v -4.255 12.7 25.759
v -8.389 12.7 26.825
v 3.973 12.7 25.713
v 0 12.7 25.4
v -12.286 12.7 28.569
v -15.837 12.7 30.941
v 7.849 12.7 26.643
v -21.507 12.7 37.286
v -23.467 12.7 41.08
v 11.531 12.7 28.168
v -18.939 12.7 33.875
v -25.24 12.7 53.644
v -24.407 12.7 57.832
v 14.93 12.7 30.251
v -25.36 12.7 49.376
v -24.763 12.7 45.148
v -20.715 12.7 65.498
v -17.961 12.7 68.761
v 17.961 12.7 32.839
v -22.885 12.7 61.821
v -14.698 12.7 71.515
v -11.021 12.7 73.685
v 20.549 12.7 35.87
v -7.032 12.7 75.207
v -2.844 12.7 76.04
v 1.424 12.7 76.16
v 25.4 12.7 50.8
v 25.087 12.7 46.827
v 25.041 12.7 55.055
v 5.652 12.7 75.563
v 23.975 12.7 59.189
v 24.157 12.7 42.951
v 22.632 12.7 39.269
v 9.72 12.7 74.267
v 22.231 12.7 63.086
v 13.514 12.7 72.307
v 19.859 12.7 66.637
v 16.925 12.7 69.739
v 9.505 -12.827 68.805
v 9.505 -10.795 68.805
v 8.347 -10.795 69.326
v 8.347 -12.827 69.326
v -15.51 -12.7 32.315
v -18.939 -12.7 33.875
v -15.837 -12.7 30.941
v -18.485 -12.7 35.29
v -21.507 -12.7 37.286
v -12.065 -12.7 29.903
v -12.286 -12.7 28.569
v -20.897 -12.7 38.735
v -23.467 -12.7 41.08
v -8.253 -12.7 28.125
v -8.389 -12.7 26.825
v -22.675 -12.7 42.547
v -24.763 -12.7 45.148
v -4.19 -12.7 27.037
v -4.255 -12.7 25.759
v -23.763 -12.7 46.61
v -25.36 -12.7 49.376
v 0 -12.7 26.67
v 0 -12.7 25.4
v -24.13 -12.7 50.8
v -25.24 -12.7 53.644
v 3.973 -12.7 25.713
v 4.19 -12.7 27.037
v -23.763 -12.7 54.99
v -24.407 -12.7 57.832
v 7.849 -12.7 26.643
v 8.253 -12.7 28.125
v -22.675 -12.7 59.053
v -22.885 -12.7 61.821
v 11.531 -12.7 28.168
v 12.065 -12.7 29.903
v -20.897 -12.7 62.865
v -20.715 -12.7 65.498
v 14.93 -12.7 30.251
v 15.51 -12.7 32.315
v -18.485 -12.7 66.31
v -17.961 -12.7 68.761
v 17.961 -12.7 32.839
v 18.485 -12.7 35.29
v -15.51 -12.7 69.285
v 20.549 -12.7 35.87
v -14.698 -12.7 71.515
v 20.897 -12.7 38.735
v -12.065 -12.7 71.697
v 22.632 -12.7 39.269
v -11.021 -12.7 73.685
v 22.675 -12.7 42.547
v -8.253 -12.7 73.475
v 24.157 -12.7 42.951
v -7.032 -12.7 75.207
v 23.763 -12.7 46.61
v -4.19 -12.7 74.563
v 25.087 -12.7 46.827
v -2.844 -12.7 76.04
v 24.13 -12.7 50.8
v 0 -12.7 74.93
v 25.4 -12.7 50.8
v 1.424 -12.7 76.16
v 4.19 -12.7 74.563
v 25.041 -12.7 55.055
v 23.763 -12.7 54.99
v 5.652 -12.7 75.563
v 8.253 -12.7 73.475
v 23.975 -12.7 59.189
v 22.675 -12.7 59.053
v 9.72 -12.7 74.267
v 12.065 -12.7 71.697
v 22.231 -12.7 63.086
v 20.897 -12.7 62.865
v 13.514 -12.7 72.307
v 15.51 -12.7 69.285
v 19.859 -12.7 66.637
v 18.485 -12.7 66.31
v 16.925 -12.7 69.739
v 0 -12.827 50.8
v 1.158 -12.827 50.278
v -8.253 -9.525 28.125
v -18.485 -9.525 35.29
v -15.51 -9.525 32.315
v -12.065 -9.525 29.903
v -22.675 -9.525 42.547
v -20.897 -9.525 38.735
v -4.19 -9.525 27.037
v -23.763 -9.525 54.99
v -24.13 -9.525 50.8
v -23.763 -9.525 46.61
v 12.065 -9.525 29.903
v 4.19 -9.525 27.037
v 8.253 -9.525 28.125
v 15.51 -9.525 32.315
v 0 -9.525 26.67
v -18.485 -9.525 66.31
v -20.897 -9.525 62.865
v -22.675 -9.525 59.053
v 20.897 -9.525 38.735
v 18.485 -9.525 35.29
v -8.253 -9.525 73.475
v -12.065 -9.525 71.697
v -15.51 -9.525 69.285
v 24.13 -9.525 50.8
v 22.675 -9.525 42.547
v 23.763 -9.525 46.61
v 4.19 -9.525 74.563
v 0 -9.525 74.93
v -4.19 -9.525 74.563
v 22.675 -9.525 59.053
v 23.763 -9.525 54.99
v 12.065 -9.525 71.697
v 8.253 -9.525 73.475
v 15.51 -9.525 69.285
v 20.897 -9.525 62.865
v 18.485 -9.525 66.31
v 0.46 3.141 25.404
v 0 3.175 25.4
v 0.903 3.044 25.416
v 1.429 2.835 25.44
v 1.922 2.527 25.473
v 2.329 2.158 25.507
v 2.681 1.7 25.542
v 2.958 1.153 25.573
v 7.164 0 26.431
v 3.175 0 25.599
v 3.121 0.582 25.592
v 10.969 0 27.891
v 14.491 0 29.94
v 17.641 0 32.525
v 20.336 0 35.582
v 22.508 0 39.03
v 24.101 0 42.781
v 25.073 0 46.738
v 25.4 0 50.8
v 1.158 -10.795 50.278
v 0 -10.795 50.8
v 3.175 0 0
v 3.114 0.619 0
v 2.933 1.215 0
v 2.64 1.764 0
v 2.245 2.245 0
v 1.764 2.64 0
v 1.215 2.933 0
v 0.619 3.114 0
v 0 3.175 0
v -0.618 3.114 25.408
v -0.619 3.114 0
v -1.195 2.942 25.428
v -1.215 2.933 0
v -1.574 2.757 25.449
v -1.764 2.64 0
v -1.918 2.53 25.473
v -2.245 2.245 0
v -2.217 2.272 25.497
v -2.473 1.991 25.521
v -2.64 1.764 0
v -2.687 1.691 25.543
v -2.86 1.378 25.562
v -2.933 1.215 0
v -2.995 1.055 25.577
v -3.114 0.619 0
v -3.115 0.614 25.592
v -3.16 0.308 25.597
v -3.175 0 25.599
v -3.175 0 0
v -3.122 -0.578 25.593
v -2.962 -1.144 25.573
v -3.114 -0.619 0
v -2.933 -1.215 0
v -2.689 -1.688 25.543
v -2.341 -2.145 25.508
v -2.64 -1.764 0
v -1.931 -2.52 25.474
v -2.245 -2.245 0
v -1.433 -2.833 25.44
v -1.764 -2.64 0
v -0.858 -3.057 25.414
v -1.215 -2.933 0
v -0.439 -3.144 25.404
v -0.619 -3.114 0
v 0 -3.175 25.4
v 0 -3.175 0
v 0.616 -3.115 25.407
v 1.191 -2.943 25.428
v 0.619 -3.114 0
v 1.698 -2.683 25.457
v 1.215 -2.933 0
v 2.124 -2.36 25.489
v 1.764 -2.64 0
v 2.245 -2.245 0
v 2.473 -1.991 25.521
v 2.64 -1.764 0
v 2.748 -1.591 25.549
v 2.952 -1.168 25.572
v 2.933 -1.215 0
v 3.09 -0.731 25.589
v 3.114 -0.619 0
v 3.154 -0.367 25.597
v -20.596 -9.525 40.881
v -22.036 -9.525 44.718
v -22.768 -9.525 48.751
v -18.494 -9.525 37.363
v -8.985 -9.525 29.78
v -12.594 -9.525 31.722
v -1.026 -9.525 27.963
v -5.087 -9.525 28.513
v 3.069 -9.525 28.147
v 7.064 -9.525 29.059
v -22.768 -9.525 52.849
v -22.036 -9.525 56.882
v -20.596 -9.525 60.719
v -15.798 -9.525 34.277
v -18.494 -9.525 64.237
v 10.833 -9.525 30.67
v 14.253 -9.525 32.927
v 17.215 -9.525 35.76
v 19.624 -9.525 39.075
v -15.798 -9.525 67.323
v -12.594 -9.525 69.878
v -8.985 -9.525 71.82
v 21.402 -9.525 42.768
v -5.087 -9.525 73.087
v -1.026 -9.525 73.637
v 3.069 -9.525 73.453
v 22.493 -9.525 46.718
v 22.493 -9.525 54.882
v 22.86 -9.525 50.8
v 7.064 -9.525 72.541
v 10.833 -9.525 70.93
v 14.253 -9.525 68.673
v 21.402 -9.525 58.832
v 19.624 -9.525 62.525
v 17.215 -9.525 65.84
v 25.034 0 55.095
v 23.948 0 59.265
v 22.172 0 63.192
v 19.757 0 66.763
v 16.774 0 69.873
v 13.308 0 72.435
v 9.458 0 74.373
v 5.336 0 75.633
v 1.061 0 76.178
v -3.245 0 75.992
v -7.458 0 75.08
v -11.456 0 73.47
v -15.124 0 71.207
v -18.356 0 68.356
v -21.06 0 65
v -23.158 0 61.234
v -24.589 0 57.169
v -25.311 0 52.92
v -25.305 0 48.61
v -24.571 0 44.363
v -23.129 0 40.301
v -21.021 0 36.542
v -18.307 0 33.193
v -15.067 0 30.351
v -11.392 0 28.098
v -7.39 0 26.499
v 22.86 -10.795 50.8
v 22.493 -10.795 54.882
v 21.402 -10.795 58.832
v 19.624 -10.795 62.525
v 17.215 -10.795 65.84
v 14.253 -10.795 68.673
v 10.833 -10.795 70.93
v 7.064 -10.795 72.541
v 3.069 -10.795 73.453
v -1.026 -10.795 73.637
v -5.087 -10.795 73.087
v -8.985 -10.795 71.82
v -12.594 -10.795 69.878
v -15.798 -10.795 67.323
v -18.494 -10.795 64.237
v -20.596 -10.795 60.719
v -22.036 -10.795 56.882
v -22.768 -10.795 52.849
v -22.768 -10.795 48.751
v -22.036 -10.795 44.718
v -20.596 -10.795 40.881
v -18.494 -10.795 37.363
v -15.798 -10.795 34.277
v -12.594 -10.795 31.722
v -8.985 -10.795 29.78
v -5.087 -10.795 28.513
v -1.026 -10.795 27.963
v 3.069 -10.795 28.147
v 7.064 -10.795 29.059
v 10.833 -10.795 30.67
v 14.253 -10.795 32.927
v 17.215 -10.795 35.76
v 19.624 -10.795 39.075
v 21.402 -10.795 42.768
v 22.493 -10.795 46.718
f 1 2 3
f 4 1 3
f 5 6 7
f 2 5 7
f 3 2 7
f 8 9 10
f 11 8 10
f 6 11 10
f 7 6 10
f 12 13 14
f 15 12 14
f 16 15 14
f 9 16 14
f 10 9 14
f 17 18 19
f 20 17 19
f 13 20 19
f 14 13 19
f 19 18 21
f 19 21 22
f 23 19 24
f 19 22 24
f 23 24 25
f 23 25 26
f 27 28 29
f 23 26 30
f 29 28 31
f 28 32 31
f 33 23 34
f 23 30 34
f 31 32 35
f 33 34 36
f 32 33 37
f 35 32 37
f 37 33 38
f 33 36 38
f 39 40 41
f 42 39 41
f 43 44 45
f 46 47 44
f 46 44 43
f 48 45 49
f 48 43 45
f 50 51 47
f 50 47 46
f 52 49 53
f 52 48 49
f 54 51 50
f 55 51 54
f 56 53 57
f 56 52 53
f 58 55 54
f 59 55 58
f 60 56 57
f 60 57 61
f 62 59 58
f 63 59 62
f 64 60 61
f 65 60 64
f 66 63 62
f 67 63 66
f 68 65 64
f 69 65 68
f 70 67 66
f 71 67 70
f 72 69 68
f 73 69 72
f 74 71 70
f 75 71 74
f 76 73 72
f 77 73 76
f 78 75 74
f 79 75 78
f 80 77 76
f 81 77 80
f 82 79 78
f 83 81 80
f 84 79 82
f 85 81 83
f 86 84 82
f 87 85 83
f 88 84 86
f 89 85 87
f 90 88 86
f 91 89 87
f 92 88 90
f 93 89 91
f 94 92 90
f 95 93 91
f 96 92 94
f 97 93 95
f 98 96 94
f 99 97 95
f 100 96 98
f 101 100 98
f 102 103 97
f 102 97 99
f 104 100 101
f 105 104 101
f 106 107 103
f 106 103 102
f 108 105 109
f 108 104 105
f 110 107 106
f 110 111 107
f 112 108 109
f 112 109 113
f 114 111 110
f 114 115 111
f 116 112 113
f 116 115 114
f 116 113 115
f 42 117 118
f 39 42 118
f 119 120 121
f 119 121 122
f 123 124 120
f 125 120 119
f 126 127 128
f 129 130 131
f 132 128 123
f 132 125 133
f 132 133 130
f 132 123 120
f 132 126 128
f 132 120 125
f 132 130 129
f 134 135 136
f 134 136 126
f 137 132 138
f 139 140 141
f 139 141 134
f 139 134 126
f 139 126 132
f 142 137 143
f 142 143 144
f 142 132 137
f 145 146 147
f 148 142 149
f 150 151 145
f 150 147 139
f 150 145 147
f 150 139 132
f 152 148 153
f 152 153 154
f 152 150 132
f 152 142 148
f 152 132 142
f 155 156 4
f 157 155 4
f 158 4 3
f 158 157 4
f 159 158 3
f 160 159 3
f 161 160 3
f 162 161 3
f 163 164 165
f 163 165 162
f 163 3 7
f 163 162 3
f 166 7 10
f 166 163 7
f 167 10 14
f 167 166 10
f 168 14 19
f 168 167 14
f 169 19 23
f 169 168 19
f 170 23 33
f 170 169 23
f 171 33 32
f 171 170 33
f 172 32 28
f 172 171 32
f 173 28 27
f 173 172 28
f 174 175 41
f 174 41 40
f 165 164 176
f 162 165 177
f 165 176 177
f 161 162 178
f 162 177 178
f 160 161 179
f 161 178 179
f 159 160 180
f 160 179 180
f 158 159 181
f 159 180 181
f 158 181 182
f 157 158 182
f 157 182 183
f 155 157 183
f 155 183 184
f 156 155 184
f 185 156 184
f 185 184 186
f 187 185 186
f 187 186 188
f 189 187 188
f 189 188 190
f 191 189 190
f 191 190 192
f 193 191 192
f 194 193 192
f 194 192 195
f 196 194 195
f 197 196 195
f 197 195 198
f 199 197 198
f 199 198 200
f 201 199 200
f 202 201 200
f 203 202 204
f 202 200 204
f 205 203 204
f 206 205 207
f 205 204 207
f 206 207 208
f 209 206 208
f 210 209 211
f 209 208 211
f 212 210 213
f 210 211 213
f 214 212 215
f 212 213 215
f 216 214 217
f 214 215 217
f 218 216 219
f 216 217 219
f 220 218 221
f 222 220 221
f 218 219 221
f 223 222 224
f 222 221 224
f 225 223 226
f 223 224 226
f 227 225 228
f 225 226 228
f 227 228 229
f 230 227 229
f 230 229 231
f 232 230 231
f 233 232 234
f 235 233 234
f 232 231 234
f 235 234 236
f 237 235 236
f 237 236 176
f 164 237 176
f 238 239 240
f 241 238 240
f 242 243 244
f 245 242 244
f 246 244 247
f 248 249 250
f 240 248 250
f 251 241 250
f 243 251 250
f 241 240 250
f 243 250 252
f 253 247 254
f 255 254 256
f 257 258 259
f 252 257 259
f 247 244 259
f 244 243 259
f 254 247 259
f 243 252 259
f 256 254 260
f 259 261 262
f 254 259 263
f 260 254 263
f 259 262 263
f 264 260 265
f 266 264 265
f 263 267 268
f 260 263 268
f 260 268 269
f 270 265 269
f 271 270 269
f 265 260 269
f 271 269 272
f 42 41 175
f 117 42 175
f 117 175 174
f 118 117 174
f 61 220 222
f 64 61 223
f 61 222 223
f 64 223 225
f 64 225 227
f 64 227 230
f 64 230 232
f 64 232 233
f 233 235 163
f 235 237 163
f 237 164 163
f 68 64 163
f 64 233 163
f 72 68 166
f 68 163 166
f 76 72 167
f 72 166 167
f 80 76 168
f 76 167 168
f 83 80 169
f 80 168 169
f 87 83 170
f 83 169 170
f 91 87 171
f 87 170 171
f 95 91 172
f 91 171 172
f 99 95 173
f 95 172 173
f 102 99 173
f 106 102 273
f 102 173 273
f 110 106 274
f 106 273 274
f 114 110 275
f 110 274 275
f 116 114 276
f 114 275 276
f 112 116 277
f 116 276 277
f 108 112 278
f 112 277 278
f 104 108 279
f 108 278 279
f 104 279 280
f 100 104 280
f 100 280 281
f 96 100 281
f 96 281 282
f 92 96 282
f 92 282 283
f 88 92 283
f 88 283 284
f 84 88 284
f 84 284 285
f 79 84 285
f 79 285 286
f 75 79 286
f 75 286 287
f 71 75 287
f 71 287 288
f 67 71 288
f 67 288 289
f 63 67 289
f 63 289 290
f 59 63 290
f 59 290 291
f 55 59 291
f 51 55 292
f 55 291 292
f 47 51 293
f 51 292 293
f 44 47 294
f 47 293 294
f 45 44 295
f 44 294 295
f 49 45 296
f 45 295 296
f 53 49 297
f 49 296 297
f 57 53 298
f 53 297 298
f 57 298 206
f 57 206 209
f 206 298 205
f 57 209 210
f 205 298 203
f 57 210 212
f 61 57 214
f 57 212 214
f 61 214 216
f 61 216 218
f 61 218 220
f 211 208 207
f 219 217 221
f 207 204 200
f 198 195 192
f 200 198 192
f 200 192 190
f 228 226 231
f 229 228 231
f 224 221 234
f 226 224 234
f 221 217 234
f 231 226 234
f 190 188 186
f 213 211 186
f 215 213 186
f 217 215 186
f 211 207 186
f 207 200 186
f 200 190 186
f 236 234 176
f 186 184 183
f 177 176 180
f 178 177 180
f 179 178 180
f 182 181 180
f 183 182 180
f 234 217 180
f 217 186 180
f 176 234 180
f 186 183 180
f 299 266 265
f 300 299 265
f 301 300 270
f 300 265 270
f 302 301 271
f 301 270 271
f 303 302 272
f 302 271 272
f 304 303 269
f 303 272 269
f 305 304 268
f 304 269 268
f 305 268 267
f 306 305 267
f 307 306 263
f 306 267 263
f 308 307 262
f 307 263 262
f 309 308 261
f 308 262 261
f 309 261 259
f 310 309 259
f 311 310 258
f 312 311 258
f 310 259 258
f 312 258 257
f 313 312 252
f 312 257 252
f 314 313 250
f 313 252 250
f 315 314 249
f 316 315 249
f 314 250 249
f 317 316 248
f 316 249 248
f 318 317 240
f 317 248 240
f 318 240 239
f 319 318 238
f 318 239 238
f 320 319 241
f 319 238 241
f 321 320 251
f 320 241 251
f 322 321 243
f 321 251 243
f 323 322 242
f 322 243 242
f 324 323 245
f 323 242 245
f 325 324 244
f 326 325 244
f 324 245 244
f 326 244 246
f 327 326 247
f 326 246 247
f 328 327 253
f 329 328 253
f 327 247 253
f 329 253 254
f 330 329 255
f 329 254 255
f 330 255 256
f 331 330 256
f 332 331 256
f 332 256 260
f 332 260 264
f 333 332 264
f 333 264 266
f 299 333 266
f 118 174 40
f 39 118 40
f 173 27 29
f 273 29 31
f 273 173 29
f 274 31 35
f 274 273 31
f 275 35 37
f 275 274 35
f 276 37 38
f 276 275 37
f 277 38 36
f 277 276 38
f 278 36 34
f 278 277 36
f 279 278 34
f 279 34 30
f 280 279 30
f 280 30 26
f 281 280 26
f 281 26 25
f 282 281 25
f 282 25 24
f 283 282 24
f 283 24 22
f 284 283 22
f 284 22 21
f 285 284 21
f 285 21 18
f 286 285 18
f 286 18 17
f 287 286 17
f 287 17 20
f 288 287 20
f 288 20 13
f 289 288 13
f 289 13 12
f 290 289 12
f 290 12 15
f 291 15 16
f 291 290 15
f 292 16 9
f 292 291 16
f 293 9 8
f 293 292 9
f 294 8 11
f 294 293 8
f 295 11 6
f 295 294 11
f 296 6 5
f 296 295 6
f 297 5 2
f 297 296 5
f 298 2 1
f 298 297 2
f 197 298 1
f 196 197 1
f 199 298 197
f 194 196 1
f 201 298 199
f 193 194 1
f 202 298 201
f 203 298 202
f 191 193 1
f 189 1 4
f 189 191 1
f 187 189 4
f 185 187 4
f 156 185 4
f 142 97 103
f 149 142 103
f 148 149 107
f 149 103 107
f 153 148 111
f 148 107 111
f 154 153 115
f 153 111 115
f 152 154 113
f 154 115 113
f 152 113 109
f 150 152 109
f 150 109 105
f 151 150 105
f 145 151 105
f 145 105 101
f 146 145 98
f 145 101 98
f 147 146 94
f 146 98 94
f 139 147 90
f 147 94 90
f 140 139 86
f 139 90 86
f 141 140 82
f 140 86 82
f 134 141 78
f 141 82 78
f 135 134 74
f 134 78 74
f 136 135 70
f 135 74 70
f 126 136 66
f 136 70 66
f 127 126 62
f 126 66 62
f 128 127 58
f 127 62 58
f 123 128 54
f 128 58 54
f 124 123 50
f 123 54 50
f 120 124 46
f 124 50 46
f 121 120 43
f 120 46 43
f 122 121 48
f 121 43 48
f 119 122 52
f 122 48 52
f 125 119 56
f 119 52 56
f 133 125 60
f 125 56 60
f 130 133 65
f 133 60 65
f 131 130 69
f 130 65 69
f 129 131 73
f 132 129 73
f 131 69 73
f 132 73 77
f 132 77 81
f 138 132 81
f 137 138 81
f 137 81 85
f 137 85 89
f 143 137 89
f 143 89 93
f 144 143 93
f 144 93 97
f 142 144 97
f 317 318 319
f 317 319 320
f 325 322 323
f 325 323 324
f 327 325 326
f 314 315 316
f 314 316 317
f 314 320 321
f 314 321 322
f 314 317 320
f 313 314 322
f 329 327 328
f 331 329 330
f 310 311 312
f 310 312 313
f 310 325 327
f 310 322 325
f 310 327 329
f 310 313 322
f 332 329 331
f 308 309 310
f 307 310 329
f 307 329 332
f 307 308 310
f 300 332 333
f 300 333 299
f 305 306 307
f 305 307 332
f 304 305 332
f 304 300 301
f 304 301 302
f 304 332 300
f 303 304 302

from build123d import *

# Parameters (mm, degrees)
F1_R      = 3.175
F2_DEPTH  = 38.1
F3_DEPTH  = 12.7
F4_R      = 24.13
F5_DEPTH  = 3.175
F6_R      = 24.13
F7_DEPTH  = 3.175
F8_R      = 22.86
F9_DEPTH  = 1.27
F11_DEPTH = 2.032


with BuildPart() as f2:
    # F1 (on Top) → F2 (new body)
    with BuildSketch(Plane.XY):
        Circle(F1_R)
    extrude(amount=F2_DEPTH)

    # F0 (on Front) → F3 (join, symmetric)
    with BuildSketch(Plane.XZ):
        with BuildLine():
            ThreePointArc((0, 25.4), (17.9605122421, 32.8394877579), (25.4, 50.8))
            ThreePointArc((25.4, 50.8), (-17.9605122421, 68.7605122421), (0, 25.4))
        make_face()
    extrude(amount=F3_DEPTH, both=True)

    # F4 (on face) → F5 (join)
    with BuildSketch(Plane.XZ.offset(12.7)):
        with Locations((0, 50.8)):
            Circle(F4_R)
    extrude(amount=-F5_DEPTH)

    # F6 (on face) → F7 (cut)
    with BuildSketch(Plane.XZ.offset(12.7)):
        with Locations((0, 50.8)):
            Circle(F6_R)
    extrude(amount=-F7_DEPTH, mode=Mode.SUBTRACT)


with BuildPart() as f9:
    # F8 (on face) → F9 (new body)
    with BuildSketch(Plane.XZ.offset(9.525)):
        with Locations((0, 50.8)):
            Circle(F8_R)
    extrude(amount=F9_DEPTH)


with BuildPart() as f11:
    # F10 (on face) → F11 (new body)
    with BuildSketch(Plane.XZ.offset(10.795)):
        Polygon((8.3469611164, 69.326484829), (0, 50.8), (1.1579053018, 50.2783149302), (9.5048664182, 68.8047997593), align=None)
    extrude(amount=F11_DEPTH)


solid = Compound([f2.part, f9.part, f11.part])
